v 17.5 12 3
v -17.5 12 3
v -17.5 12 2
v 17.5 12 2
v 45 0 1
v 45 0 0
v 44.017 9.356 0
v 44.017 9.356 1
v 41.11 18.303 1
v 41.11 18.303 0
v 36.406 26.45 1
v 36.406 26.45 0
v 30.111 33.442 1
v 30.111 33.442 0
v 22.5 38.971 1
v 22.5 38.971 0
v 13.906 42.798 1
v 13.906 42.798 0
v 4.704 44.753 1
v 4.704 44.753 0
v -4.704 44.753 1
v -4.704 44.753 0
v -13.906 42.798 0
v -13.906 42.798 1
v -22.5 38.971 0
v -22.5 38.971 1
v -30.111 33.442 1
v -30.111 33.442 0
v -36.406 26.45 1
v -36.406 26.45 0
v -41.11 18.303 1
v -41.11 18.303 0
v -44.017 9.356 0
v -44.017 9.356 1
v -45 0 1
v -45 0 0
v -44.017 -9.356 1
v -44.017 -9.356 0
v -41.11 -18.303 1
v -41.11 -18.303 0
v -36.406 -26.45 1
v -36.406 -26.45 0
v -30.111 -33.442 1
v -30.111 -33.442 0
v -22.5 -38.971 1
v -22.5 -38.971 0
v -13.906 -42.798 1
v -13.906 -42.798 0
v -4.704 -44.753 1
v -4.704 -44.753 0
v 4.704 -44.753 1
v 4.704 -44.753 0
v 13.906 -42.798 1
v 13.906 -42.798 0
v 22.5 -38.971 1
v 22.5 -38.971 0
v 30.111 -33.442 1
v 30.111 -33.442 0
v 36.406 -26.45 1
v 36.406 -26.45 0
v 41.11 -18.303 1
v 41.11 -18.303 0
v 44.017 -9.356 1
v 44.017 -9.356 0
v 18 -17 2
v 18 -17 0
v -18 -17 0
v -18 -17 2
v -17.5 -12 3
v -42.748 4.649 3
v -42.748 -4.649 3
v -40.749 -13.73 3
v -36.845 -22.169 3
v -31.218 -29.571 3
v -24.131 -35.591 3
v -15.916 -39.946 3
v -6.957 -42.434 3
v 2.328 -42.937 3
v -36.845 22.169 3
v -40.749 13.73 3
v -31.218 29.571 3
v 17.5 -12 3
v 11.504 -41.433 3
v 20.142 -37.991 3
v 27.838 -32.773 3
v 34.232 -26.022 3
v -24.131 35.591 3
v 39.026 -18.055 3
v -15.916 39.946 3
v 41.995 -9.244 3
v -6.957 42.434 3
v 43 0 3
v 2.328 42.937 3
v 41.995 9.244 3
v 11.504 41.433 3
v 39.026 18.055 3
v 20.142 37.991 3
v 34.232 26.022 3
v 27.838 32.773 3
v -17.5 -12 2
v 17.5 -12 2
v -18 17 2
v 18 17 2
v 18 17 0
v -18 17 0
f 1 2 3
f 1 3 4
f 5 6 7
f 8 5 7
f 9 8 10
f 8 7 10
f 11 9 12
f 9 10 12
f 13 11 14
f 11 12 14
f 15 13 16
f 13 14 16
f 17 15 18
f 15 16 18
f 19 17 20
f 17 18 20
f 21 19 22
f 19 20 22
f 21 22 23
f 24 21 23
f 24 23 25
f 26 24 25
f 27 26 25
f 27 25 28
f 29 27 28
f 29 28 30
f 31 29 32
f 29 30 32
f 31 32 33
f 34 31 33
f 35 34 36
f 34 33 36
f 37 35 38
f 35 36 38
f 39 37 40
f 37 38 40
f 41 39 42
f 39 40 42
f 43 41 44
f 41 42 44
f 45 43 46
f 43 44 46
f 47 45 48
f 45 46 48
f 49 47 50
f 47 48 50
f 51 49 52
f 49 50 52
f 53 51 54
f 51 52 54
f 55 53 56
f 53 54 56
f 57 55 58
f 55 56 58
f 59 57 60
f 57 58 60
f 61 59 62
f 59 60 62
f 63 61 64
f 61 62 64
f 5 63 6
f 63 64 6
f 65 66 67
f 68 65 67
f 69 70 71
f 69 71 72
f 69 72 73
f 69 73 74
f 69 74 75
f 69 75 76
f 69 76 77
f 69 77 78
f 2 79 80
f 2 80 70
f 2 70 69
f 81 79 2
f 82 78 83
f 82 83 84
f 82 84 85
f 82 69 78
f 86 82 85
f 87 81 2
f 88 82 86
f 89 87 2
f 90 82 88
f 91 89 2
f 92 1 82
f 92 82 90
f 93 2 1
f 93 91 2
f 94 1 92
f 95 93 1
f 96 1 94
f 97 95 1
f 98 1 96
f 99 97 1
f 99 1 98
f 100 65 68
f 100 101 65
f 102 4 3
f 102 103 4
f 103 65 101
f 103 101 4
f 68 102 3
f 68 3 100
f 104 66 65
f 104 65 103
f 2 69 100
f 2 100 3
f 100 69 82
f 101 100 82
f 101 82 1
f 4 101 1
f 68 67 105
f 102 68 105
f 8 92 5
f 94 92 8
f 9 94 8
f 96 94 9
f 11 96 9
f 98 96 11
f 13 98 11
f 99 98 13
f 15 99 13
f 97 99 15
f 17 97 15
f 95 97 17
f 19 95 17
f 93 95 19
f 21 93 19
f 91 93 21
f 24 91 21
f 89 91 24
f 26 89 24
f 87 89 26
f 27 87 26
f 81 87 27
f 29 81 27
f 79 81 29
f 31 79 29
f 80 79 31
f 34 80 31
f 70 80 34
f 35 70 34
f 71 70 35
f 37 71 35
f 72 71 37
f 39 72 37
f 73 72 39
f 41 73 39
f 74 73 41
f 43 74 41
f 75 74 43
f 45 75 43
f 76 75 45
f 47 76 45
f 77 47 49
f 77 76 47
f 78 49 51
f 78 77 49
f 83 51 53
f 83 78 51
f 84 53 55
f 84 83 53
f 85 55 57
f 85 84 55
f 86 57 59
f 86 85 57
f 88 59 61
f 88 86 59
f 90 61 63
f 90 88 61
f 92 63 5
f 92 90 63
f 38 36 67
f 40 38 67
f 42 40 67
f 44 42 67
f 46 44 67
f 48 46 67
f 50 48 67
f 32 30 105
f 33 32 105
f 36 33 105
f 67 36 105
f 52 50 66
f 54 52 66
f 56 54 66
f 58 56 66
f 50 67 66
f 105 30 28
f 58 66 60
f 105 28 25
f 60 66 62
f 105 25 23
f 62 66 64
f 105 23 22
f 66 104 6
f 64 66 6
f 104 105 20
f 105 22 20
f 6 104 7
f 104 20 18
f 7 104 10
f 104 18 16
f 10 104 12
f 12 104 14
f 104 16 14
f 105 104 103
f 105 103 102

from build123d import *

# Parameters (mm, degrees)
SKETCH1_R           = 45
BOSS_EXTRUDE1_DEPTH = 3
SKETCH2_W           = 35
SKETCH2_H           = 24
CUT_EXTRUDE1_DEPTH  = 3
CHAMFER1_SIZE       = 2
SKETCH3_W           = 36
SKETCH3_H           = 34
CUT_EXTRUDE2_DEPTH  = 2


with BuildPart() as part:
    # Sketch1 → Boss-Extrude1 (new body)
    with BuildSketch(Plane.XY):
        Circle(SKETCH1_R)
    extrude(amount=BOSS_EXTRUDE1_DEPTH)

    # Sketch2 → Cut-Extrude1 (cut)
    with BuildSketch(Plane.XY.offset(3)):
        Rectangle(SKETCH2_W, SKETCH2_H)
    extrude(amount=-CUT_EXTRUDE1_DEPTH, mode=Mode.SUBTRACT)

    # Chamfer1
    chamfer1_edges = [part.edges().sort_by_distance(p)[0] for p in [
        (-45, 0, 3),
    ]]
    chamfer(chamfer1_edges, length=CHAMFER1_SIZE)

    # Sketch3 → Cut-Extrude2 (cut)
    with BuildSketch(Plane(origin=(0, 0, 0), x_dir=(-1, 0, 0), z_dir=(0, 0, -1))):
        Rectangle(SKETCH3_W, SKETCH3_H)
    extrude(amount=-CUT_EXTRUDE2_DEPTH, mode=Mode.SUBTRACT)


solid = part.part
